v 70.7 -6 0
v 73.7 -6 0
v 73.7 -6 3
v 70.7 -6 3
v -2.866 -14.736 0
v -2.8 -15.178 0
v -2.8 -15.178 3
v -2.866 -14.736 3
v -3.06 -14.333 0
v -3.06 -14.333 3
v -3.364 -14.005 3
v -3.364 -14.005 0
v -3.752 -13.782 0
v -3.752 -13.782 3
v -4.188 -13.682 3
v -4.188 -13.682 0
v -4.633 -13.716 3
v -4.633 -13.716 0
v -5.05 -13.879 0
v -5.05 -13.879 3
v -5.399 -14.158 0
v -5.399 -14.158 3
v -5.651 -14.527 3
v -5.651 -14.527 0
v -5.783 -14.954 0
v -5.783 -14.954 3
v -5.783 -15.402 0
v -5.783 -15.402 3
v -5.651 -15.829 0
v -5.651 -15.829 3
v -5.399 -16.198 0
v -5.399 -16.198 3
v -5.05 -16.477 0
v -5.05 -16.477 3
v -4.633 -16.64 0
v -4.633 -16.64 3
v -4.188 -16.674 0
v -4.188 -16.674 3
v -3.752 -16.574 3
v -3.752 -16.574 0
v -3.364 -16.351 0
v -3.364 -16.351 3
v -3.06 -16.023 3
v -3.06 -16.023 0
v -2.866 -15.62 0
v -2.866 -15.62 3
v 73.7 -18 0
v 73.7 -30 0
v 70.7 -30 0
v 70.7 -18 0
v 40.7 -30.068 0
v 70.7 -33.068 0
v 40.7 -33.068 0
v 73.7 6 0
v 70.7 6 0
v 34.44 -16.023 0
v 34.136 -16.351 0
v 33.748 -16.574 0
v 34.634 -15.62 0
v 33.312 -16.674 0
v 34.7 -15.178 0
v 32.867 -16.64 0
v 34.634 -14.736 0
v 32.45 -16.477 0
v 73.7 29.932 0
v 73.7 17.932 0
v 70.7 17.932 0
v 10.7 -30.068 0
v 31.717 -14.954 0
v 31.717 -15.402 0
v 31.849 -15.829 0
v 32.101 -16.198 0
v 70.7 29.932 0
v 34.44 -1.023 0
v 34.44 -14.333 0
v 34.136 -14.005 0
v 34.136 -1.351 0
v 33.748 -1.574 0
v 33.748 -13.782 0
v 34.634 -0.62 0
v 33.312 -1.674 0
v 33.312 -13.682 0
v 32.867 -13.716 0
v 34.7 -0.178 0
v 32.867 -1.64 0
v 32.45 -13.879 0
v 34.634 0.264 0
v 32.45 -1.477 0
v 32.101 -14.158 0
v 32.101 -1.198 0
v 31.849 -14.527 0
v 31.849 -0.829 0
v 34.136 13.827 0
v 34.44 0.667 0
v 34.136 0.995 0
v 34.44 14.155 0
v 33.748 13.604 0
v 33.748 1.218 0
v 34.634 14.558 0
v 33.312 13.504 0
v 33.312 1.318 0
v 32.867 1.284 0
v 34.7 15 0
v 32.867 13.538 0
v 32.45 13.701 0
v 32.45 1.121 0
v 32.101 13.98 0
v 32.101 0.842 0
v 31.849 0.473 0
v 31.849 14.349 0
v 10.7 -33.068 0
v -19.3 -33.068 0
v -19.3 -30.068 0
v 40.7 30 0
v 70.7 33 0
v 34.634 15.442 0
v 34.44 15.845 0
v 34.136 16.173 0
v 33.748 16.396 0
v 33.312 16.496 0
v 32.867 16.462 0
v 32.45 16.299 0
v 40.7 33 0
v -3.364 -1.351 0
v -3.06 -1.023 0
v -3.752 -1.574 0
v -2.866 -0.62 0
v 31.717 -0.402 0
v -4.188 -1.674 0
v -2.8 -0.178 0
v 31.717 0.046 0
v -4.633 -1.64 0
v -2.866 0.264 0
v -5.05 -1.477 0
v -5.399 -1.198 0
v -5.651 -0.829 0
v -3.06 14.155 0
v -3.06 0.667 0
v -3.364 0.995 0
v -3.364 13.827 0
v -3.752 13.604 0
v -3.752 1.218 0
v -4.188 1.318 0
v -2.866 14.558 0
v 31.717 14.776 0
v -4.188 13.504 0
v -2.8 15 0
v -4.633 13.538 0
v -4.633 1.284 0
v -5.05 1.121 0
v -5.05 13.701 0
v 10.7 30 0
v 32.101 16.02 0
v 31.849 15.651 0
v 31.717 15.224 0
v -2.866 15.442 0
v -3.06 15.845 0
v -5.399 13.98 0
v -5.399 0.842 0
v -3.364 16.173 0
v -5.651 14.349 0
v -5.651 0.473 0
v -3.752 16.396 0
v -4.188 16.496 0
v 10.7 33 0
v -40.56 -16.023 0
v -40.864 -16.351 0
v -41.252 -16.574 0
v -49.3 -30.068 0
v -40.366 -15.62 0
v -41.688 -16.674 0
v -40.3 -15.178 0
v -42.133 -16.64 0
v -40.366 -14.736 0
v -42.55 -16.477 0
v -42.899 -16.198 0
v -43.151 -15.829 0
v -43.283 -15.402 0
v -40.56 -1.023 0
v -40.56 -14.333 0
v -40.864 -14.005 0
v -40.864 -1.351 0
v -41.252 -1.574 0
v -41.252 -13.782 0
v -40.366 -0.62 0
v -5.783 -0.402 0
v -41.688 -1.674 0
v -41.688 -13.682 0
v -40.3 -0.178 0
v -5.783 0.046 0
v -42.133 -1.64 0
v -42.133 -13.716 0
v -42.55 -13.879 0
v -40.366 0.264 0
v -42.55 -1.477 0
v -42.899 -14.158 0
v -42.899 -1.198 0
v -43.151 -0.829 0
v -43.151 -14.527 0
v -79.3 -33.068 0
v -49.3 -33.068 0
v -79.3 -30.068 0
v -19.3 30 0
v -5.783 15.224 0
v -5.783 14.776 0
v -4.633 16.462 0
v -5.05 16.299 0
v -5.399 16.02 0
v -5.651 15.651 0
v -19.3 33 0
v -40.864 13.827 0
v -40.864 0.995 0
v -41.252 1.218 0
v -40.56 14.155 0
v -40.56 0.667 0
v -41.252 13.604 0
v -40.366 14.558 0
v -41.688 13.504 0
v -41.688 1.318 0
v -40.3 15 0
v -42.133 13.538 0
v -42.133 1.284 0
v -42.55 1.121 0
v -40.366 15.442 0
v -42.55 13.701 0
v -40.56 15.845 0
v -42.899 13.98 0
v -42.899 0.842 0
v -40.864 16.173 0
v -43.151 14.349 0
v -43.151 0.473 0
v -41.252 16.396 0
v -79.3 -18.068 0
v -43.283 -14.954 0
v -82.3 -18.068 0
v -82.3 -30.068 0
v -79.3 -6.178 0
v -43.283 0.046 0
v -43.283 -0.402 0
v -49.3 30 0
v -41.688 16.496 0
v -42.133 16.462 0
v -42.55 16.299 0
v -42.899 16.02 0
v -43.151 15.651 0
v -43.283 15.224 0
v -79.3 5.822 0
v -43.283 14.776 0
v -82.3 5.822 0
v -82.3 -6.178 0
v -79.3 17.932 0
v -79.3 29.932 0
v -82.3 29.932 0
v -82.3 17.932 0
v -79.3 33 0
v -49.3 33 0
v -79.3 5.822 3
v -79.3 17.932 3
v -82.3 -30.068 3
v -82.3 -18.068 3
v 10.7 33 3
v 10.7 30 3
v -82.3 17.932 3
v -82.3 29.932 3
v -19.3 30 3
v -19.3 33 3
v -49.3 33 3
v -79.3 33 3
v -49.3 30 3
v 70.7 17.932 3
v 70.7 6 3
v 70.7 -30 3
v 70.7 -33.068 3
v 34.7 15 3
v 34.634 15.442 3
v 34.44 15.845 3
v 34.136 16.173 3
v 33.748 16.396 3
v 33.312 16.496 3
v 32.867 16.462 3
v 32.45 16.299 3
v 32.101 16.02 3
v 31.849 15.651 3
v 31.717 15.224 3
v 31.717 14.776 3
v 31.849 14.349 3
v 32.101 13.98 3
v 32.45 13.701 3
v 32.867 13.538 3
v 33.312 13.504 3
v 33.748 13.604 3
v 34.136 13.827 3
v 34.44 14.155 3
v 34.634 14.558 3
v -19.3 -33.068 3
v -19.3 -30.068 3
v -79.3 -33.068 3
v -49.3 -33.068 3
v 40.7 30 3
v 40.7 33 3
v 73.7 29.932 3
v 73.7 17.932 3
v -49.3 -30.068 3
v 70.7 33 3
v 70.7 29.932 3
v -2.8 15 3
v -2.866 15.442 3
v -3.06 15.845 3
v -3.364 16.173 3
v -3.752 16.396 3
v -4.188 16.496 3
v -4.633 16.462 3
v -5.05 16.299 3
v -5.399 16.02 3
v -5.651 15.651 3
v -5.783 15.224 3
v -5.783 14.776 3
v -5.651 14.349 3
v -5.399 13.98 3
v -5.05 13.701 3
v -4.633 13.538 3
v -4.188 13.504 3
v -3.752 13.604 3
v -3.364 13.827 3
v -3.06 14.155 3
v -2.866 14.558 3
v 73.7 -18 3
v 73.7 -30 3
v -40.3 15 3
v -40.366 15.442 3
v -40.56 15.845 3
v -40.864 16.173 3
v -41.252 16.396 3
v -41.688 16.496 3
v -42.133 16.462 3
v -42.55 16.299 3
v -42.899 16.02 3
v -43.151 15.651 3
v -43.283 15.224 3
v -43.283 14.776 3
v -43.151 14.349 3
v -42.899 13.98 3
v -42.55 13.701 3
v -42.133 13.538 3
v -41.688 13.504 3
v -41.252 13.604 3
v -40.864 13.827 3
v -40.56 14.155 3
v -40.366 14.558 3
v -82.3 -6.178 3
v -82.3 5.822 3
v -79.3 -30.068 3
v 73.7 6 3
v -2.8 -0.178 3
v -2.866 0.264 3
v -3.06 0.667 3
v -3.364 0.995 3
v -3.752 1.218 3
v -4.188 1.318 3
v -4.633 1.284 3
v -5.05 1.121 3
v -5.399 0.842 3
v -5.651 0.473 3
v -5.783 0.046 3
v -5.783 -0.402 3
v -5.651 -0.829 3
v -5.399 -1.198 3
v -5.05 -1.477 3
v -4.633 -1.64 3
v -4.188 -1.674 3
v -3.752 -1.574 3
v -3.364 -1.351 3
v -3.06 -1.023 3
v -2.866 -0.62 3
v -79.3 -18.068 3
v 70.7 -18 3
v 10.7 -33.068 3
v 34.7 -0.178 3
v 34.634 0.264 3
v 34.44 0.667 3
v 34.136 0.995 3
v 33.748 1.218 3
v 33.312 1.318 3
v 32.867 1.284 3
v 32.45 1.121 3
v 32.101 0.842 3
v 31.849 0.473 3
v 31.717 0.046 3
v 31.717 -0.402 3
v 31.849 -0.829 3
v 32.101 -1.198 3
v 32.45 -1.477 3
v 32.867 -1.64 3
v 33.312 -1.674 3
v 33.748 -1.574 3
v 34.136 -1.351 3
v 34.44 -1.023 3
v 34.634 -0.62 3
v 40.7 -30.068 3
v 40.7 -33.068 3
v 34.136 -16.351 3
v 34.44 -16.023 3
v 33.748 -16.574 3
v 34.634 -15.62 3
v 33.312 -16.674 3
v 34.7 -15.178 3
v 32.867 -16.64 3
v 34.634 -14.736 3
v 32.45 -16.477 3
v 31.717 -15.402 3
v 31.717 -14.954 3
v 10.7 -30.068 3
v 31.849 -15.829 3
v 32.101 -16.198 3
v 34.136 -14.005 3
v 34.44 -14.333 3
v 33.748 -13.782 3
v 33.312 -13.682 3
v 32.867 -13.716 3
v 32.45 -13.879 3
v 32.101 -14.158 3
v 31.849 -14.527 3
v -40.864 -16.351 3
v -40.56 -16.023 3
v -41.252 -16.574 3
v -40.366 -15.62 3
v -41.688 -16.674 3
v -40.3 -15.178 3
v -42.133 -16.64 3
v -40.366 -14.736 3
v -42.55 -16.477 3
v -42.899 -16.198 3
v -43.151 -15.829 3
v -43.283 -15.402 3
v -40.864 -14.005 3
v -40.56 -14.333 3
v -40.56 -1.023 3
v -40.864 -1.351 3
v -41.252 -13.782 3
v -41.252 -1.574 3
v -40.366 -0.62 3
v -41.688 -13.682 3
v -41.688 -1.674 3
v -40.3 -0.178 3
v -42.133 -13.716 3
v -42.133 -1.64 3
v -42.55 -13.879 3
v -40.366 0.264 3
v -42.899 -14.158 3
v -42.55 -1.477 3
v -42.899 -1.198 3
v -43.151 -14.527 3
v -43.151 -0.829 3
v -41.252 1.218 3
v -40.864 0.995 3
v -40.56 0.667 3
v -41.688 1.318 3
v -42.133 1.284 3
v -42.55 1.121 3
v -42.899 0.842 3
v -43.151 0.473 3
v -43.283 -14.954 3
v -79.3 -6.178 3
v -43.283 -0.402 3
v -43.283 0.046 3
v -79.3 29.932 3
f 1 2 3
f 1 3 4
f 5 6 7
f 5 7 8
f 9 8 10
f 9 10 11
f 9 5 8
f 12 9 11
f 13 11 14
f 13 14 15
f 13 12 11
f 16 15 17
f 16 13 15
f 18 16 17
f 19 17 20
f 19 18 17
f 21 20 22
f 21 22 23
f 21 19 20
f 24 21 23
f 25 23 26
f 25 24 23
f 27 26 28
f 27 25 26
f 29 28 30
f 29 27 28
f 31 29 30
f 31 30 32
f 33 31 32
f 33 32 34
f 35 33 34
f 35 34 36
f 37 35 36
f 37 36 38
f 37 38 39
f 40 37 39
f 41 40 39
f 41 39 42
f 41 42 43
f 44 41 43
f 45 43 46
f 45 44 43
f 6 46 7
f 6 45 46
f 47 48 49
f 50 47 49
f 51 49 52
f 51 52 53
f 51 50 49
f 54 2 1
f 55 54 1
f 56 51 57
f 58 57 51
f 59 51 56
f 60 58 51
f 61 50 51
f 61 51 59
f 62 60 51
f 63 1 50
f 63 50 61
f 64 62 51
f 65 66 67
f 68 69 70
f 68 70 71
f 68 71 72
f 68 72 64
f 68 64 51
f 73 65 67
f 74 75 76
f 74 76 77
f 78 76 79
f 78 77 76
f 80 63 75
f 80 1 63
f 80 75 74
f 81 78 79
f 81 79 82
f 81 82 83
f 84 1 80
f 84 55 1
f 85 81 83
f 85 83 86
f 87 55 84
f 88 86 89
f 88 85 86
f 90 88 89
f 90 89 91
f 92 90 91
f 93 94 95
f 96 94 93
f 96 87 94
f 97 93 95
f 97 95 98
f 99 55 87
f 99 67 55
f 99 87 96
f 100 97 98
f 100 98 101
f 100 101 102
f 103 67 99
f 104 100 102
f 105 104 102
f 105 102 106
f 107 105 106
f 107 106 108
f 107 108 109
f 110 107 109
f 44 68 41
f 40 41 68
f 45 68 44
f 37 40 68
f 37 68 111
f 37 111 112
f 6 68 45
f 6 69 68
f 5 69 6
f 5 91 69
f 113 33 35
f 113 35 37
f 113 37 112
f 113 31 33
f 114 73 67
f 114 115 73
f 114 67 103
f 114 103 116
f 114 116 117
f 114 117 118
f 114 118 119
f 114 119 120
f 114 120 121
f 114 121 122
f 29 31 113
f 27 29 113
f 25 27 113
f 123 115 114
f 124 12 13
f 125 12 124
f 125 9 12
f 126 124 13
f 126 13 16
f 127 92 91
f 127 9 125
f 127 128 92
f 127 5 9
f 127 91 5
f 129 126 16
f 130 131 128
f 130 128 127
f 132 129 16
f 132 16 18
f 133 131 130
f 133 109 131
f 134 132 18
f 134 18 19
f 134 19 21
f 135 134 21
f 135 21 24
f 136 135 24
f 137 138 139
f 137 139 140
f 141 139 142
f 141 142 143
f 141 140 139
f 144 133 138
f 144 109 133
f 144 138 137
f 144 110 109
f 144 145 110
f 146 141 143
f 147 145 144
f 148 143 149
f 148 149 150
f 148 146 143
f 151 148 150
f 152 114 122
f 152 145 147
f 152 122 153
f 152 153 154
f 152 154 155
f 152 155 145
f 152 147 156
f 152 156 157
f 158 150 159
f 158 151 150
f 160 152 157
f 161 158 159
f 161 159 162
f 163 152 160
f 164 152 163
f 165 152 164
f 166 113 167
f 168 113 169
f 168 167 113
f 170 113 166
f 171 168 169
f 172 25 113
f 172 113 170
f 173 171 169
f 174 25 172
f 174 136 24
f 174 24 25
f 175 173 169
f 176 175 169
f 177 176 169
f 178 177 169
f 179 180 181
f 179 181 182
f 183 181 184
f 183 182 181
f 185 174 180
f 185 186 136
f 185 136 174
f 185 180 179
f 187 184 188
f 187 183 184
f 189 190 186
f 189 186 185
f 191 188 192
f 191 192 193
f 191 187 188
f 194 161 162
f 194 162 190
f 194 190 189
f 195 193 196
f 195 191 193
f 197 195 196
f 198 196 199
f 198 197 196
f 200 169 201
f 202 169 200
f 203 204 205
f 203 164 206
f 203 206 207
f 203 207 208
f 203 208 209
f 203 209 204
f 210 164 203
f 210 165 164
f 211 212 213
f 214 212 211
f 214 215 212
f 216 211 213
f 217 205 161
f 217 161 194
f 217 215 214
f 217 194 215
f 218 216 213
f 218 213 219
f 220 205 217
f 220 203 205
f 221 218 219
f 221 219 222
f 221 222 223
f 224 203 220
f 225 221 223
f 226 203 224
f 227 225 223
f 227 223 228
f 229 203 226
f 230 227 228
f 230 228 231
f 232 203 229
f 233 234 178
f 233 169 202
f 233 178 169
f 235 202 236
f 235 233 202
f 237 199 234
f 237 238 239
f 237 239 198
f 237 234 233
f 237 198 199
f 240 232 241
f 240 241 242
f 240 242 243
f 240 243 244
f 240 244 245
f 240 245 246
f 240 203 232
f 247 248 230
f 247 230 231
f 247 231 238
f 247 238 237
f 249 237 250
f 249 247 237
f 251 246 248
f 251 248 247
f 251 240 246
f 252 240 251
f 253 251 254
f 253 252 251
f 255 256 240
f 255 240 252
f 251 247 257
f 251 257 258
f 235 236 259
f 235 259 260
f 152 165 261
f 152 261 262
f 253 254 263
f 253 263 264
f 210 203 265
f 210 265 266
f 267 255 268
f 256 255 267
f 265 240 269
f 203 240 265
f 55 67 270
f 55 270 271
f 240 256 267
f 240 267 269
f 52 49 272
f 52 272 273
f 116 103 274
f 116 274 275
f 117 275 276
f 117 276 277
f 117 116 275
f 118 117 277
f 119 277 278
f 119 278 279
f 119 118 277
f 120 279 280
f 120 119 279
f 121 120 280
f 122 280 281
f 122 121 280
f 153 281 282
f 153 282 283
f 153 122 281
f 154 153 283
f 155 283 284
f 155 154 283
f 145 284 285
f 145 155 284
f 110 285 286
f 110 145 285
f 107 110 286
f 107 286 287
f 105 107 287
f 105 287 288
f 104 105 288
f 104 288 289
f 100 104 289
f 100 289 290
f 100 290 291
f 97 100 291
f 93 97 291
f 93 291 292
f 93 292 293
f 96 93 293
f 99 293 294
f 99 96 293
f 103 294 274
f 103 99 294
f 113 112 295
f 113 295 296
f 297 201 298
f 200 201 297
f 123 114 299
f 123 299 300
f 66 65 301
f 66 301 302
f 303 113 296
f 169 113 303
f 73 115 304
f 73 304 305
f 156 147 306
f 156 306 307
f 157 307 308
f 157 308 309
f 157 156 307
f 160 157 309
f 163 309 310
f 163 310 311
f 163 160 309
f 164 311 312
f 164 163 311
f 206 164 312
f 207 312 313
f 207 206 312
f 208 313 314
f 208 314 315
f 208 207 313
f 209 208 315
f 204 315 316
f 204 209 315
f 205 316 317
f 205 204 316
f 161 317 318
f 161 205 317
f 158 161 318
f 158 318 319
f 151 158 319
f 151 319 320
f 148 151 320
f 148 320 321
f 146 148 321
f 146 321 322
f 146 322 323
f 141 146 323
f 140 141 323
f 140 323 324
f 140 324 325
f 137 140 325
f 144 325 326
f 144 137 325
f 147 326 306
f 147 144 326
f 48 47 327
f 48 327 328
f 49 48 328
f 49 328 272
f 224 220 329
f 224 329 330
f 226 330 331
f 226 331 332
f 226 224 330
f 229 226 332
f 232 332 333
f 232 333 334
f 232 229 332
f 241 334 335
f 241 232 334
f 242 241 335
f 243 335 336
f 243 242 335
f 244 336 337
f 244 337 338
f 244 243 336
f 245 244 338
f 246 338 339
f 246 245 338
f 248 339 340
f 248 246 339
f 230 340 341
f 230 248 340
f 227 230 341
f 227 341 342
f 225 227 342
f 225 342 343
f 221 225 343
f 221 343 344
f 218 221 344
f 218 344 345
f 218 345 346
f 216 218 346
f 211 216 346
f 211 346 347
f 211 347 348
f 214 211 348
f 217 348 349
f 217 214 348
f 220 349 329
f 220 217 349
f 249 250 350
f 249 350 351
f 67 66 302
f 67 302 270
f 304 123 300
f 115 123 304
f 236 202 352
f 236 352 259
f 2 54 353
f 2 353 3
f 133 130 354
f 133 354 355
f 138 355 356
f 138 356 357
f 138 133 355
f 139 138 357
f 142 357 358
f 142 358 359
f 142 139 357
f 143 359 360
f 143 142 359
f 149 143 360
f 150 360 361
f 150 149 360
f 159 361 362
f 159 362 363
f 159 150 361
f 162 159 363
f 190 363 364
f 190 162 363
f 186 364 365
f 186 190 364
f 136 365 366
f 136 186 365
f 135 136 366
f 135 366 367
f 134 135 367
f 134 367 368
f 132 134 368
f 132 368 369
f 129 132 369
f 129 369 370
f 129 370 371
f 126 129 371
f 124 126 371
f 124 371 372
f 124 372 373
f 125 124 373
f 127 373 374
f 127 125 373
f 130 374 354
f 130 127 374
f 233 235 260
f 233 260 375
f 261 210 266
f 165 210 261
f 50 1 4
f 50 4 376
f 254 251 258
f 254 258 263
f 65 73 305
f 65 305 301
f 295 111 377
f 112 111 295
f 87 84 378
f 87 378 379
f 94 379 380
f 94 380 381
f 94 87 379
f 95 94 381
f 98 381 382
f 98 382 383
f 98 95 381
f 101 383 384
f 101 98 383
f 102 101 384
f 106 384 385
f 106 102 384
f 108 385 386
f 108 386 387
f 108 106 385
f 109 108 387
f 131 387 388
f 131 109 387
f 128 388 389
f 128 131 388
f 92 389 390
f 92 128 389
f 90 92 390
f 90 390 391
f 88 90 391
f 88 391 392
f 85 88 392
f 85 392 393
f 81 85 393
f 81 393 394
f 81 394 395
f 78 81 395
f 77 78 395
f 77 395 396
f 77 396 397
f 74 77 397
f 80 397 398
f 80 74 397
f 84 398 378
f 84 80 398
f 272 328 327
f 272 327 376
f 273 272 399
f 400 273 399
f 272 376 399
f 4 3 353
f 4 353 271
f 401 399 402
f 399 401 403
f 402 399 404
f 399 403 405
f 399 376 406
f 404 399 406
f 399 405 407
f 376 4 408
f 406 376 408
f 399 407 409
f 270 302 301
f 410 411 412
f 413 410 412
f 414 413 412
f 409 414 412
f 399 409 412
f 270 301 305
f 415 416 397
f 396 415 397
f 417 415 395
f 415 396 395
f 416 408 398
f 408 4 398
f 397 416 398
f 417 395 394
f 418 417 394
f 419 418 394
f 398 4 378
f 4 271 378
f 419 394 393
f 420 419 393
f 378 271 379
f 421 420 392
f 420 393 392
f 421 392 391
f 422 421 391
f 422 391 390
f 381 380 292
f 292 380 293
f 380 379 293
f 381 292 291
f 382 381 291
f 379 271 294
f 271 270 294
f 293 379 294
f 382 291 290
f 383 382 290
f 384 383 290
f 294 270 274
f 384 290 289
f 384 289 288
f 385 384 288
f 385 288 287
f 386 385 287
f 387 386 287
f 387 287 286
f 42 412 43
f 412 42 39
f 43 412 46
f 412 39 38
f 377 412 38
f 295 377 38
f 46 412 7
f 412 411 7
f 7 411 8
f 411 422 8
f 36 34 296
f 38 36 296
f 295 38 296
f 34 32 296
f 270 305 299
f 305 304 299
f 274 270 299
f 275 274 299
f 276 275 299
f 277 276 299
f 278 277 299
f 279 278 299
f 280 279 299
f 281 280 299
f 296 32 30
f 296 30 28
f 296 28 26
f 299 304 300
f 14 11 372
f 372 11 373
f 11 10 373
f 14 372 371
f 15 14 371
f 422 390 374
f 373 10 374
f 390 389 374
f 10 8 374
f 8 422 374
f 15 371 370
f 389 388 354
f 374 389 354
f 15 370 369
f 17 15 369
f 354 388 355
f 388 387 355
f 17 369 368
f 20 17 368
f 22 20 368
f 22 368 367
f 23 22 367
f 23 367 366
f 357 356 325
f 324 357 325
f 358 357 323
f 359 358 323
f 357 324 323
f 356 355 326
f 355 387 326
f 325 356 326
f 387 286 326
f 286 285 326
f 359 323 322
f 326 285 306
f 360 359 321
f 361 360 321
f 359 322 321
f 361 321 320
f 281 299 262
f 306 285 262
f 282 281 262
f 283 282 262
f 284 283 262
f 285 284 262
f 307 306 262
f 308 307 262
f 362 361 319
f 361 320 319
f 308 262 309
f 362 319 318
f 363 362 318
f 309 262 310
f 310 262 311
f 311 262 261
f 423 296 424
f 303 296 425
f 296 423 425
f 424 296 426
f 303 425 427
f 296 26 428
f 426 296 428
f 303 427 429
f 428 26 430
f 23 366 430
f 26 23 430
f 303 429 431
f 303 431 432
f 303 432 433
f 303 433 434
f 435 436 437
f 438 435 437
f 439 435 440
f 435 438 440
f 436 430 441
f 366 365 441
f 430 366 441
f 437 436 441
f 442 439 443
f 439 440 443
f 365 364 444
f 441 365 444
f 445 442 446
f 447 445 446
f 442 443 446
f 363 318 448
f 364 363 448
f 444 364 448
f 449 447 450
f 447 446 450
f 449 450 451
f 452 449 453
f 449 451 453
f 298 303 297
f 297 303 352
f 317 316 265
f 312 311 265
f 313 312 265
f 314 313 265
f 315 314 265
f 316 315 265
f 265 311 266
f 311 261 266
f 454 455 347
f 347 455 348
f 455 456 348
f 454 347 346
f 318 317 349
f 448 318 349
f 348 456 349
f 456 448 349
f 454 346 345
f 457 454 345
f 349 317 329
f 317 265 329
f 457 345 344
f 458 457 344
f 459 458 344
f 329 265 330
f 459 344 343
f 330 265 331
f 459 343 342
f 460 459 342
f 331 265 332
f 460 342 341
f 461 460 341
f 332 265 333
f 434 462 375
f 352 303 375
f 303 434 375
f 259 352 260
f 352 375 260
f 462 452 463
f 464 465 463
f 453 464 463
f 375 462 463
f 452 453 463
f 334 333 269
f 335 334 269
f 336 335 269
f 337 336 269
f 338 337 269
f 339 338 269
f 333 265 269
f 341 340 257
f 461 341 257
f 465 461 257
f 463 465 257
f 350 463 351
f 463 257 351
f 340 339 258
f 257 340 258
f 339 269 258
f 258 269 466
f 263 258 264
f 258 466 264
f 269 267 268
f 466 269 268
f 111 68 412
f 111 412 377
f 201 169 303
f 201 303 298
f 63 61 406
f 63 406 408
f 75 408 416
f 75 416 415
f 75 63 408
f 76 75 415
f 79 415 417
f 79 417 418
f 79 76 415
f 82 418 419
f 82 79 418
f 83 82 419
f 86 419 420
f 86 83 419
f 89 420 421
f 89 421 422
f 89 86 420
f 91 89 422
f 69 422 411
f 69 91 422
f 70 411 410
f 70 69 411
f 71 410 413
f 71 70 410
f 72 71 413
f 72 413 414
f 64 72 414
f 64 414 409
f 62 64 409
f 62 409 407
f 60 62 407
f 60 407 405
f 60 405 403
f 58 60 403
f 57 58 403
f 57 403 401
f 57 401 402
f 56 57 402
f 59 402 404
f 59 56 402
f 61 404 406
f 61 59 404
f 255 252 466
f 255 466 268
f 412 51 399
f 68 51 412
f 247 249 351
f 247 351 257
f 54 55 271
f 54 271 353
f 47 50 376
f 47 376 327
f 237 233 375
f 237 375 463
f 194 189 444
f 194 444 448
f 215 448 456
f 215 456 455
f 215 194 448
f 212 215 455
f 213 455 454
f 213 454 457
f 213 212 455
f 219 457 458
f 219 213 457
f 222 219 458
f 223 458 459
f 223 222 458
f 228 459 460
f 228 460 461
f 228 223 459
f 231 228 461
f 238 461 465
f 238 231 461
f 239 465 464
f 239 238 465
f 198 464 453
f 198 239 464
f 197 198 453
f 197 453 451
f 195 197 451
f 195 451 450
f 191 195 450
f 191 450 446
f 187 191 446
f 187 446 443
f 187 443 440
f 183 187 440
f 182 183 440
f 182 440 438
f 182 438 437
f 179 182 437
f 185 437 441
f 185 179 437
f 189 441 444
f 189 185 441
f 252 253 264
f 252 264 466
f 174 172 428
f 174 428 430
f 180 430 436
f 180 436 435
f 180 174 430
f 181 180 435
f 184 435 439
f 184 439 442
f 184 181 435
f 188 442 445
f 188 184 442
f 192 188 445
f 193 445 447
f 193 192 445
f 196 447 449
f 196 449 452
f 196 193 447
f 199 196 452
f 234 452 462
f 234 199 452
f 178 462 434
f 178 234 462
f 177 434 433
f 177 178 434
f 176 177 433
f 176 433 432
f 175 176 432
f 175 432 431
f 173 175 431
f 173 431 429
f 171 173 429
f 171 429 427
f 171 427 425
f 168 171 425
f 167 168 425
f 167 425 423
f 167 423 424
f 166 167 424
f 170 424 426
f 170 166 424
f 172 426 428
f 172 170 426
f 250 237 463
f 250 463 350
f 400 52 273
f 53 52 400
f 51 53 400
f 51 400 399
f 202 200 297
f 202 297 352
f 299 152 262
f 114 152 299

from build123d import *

# Parameters (mm, degrees)
ESBO_O1_R                = 1.5
RESSALTO_EXTRUS_O1_DEPTH = 3


with BuildPart() as part:
    # Esboço1 → Ressalto-extrusão1 (new body)
    with BuildSketch(Plane.XY):
        Polygon((40.700385396, -30.0684829), (10.700385396, -30.0684829), (10.700385396, -33.0684829), (-19.299614604, -33.0684829), (-19.299614604, -30.0684829), (-49.299614604, -30.0684829), (-49.299614604, -33.0684829), (-79.299614604, -33.0684829), (-79.299614604, -30.0684829), (-82.299614604, -30.0684829), (-82.299614604, -18.0684829), (-79.299614604, -18.0684829), (-79.299614604, -6.178045813), (-82.299614604, -6.178045813), (-82.299614604, 5.821954187), (-79.299614604, 5.821954187), (-79.299614604, 17.9315171), (-82.299614604, 17.9315171), (-82.299614604, 29.9315171), (-79.299614604, 29.9315171), (-79.299614604, 33), (-49.299614604, 33), (-49.299614604, 30), (-19.299614604, 30), (-19.299614604, 33), (10.700385396, 33), (10.700385396, 30), (40.700385396, 30), (40.700385396, 33), (70.700385396, 33), (70.700385396, 29.9315171), (73.700385396, 29.9315171), (73.700385396, 17.9315171), (70.700385396, 17.9315171), (70.700385396, 5.999991894), (73.700385396, 5.999991894), (73.700385396, -6.000008106), (70.700385396, -6.000008106), (70.700385396, -18.000008106), (73.700385396, -18.000008106), (73.700385396, -30.000008106), (70.700385396, -30.000008106), (70.700385396, -33.0684829), (40.700385396, -33.0684829), align=None)
        with Locations((33.200385396, 15)):
            Circle(ESBO_O1_R, mode=Mode.SUBTRACT)
        with Locations((-4.299614604, -0.178045813)):
            Circle(ESBO_O1_R, mode=Mode.SUBTRACT)
        with Locations((-41.799614604, 15)):
            Circle(ESBO_O1_R, mode=Mode.SUBTRACT)
        with Locations((-41.799614604, -0.178045813)):
            Circle(ESBO_O1_R, mode=Mode.SUBTRACT)
        with Locations((-4.299614604, -15.178045813)):
            Circle(ESBO_O1_R, mode=Mode.SUBTRACT)
        with Locations((-41.799614604, -15.178045813)):
            Circle(ESBO_O1_R, mode=Mode.SUBTRACT)
        with Locations((33.200385396, -0.178045813)):
            Circle(ESBO_O1_R, mode=Mode.SUBTRACT)
        with Locations((33.200385396, -15.178045813)):
            Circle(ESBO_O1_R, mode=Mode.SUBTRACT)
        with Locations((-4.299614604, 15)):
            Circle(ESBO_O1_R, mode=Mode.SUBTRACT)
    extrude(amount=RESSALTO_EXTRUS_O1_DEPTH)


solid = part.part
